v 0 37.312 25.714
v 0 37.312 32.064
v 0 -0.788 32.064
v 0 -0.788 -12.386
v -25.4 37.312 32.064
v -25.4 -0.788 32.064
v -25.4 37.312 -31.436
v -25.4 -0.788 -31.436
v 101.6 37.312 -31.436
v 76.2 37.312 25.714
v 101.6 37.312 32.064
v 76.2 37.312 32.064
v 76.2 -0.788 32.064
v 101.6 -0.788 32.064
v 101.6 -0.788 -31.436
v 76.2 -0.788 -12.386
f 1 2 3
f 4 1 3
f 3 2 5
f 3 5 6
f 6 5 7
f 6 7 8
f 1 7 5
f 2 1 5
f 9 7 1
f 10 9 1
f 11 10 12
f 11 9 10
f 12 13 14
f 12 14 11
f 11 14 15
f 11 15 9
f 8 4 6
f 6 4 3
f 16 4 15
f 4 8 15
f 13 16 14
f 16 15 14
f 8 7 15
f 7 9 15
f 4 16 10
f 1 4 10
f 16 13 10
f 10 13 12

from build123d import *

# Parameters (mm, degrees)
F0_W     = 38.1
F0_H     = 63.5
F1_DEPTH = 76.2
F3_DEPTH = 76.2
F4_W     = 38.1
F4_H     = 63.5
F5_DEPTH = 25.4
F6_W     = 38.1
F6_H     = 63.5
F7_DEPTH = 25.4


with BuildPart() as f1:
    # F0 (on Right) → F1 (new body)
    with BuildSketch(Plane.YZ):
        with Locations((18.2618855059, 0.314003706)):
            Rectangle(F0_W, F0_H)
    extrude(amount=F1_DEPTH)

    # F2 (on face) → F3 (cut)
    with BuildSketch(Plane.YZ.offset(76.2)):
        Polygon((-0.7881144941, 32.064003706), (-0.7881144941, -12.385996294), (37.3118855059, 25.714003706), (37.3118855059, 32.064003706), align=None)
    extrude(amount=-F3_DEPTH, mode=Mode.SUBTRACT)

    # F4 (on face) → F5 (join)
    with BuildSketch(Plane.YZ.offset(76.2)):
        with Locations((18.2618855059, 0.314003706)):
            Rectangle(F4_W, F4_H)
    extrude(amount=F5_DEPTH)

    # F6 (on face) → F7 (join)
    with BuildSketch(Plane(origin=(0, 0, 0), x_dir=(0, -1, 0), z_dir=(-1, 0, 0))):
        with Locations((-18.2618855059, 0.314003706)):
            Rectangle(F6_W, F6_H)
    extrude(amount=F7_DEPTH)


solid = f1.part
